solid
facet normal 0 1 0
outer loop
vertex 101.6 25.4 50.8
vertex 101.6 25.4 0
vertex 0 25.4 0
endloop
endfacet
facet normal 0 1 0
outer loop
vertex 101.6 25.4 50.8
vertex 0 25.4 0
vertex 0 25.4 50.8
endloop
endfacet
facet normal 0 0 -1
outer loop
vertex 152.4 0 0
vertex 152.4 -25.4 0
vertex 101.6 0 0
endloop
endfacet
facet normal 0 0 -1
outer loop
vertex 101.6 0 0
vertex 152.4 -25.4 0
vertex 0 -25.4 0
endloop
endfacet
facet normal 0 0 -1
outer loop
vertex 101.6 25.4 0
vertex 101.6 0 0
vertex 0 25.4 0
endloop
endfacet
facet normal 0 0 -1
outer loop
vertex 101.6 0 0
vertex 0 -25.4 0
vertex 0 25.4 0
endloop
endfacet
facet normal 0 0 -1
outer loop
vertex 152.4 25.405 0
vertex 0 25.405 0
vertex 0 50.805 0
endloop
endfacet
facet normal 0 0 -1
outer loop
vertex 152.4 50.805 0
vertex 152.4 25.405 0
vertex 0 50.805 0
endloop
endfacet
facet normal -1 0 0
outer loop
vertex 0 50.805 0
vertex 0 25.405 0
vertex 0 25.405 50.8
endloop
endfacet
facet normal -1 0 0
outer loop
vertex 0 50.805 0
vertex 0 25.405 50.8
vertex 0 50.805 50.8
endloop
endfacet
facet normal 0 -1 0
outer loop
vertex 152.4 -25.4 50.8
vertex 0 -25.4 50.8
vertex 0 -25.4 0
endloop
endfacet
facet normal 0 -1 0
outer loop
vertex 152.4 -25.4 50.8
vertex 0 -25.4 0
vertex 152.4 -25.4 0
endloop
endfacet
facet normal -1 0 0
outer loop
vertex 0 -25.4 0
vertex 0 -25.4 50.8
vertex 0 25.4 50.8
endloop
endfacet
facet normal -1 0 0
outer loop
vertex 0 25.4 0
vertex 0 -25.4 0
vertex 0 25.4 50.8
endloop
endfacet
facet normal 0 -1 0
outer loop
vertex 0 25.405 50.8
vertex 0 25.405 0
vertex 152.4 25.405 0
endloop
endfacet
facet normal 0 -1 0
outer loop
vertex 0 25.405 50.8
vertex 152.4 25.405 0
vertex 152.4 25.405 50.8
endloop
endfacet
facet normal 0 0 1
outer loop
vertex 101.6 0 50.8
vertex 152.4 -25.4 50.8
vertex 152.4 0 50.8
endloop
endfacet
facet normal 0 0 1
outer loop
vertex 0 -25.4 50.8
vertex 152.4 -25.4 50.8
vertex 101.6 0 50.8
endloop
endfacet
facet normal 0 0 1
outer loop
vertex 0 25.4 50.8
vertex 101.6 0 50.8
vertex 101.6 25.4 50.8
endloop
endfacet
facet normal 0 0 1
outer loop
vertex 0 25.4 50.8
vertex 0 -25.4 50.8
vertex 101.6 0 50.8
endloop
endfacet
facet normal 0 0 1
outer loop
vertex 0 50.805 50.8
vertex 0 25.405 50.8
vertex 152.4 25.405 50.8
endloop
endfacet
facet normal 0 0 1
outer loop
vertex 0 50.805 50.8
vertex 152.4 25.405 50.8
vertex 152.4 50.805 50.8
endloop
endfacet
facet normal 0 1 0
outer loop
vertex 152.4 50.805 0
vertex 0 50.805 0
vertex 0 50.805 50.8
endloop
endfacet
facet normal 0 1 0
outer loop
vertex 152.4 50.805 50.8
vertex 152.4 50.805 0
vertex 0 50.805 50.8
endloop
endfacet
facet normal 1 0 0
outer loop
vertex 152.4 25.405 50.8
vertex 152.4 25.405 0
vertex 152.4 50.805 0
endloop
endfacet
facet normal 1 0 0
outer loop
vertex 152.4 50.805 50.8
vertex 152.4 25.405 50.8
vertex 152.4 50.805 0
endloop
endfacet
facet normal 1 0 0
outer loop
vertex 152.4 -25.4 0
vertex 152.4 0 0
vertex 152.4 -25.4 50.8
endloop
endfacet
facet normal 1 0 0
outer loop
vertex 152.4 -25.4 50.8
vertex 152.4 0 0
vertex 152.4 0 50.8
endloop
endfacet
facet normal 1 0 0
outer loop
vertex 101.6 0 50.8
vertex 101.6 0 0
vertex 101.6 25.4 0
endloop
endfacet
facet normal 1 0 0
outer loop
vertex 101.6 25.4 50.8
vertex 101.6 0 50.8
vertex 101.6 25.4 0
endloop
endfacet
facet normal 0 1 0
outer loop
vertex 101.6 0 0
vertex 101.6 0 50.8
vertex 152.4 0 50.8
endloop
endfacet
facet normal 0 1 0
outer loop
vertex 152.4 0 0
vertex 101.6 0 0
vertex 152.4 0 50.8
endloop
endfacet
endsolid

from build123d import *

# Parameters (mm, degrees)
F0_W     = 152.4
F0_H     = 50.8
F1_DEPTH = 25.4
F2_W     = 25.4
F2_H     = 50.8
F3_DEPTH = 101.6
F4_W     = 25.4
F4_H     = 50.8
F5_DEPTH = 152.4


with BuildPart() as f1:
    # F0 (on Front) → F1 (new body)
    with BuildSketch(Plane.XZ):
        with Locations((76.2, 25.4)):
            Rectangle(F0_W, F0_H)
    extrude(amount=F1_DEPTH)

    # F2 (on Right) → F3 (join)
    with BuildSketch(Plane.YZ):
        with Locations((12.7, 25.4)):
            Rectangle(F2_W, F2_H)
    extrude(amount=F3_DEPTH)


with BuildPart() as f5:
    # F4 (on Right) → F5 (new body)
    with BuildSketch(Plane.YZ):
        with Locations((38.104634, 25.4)):
            Rectangle(F4_W, F4_H)
    extrude(amount=F5_DEPTH)


solid = Compound([f1.part, f5.part])
